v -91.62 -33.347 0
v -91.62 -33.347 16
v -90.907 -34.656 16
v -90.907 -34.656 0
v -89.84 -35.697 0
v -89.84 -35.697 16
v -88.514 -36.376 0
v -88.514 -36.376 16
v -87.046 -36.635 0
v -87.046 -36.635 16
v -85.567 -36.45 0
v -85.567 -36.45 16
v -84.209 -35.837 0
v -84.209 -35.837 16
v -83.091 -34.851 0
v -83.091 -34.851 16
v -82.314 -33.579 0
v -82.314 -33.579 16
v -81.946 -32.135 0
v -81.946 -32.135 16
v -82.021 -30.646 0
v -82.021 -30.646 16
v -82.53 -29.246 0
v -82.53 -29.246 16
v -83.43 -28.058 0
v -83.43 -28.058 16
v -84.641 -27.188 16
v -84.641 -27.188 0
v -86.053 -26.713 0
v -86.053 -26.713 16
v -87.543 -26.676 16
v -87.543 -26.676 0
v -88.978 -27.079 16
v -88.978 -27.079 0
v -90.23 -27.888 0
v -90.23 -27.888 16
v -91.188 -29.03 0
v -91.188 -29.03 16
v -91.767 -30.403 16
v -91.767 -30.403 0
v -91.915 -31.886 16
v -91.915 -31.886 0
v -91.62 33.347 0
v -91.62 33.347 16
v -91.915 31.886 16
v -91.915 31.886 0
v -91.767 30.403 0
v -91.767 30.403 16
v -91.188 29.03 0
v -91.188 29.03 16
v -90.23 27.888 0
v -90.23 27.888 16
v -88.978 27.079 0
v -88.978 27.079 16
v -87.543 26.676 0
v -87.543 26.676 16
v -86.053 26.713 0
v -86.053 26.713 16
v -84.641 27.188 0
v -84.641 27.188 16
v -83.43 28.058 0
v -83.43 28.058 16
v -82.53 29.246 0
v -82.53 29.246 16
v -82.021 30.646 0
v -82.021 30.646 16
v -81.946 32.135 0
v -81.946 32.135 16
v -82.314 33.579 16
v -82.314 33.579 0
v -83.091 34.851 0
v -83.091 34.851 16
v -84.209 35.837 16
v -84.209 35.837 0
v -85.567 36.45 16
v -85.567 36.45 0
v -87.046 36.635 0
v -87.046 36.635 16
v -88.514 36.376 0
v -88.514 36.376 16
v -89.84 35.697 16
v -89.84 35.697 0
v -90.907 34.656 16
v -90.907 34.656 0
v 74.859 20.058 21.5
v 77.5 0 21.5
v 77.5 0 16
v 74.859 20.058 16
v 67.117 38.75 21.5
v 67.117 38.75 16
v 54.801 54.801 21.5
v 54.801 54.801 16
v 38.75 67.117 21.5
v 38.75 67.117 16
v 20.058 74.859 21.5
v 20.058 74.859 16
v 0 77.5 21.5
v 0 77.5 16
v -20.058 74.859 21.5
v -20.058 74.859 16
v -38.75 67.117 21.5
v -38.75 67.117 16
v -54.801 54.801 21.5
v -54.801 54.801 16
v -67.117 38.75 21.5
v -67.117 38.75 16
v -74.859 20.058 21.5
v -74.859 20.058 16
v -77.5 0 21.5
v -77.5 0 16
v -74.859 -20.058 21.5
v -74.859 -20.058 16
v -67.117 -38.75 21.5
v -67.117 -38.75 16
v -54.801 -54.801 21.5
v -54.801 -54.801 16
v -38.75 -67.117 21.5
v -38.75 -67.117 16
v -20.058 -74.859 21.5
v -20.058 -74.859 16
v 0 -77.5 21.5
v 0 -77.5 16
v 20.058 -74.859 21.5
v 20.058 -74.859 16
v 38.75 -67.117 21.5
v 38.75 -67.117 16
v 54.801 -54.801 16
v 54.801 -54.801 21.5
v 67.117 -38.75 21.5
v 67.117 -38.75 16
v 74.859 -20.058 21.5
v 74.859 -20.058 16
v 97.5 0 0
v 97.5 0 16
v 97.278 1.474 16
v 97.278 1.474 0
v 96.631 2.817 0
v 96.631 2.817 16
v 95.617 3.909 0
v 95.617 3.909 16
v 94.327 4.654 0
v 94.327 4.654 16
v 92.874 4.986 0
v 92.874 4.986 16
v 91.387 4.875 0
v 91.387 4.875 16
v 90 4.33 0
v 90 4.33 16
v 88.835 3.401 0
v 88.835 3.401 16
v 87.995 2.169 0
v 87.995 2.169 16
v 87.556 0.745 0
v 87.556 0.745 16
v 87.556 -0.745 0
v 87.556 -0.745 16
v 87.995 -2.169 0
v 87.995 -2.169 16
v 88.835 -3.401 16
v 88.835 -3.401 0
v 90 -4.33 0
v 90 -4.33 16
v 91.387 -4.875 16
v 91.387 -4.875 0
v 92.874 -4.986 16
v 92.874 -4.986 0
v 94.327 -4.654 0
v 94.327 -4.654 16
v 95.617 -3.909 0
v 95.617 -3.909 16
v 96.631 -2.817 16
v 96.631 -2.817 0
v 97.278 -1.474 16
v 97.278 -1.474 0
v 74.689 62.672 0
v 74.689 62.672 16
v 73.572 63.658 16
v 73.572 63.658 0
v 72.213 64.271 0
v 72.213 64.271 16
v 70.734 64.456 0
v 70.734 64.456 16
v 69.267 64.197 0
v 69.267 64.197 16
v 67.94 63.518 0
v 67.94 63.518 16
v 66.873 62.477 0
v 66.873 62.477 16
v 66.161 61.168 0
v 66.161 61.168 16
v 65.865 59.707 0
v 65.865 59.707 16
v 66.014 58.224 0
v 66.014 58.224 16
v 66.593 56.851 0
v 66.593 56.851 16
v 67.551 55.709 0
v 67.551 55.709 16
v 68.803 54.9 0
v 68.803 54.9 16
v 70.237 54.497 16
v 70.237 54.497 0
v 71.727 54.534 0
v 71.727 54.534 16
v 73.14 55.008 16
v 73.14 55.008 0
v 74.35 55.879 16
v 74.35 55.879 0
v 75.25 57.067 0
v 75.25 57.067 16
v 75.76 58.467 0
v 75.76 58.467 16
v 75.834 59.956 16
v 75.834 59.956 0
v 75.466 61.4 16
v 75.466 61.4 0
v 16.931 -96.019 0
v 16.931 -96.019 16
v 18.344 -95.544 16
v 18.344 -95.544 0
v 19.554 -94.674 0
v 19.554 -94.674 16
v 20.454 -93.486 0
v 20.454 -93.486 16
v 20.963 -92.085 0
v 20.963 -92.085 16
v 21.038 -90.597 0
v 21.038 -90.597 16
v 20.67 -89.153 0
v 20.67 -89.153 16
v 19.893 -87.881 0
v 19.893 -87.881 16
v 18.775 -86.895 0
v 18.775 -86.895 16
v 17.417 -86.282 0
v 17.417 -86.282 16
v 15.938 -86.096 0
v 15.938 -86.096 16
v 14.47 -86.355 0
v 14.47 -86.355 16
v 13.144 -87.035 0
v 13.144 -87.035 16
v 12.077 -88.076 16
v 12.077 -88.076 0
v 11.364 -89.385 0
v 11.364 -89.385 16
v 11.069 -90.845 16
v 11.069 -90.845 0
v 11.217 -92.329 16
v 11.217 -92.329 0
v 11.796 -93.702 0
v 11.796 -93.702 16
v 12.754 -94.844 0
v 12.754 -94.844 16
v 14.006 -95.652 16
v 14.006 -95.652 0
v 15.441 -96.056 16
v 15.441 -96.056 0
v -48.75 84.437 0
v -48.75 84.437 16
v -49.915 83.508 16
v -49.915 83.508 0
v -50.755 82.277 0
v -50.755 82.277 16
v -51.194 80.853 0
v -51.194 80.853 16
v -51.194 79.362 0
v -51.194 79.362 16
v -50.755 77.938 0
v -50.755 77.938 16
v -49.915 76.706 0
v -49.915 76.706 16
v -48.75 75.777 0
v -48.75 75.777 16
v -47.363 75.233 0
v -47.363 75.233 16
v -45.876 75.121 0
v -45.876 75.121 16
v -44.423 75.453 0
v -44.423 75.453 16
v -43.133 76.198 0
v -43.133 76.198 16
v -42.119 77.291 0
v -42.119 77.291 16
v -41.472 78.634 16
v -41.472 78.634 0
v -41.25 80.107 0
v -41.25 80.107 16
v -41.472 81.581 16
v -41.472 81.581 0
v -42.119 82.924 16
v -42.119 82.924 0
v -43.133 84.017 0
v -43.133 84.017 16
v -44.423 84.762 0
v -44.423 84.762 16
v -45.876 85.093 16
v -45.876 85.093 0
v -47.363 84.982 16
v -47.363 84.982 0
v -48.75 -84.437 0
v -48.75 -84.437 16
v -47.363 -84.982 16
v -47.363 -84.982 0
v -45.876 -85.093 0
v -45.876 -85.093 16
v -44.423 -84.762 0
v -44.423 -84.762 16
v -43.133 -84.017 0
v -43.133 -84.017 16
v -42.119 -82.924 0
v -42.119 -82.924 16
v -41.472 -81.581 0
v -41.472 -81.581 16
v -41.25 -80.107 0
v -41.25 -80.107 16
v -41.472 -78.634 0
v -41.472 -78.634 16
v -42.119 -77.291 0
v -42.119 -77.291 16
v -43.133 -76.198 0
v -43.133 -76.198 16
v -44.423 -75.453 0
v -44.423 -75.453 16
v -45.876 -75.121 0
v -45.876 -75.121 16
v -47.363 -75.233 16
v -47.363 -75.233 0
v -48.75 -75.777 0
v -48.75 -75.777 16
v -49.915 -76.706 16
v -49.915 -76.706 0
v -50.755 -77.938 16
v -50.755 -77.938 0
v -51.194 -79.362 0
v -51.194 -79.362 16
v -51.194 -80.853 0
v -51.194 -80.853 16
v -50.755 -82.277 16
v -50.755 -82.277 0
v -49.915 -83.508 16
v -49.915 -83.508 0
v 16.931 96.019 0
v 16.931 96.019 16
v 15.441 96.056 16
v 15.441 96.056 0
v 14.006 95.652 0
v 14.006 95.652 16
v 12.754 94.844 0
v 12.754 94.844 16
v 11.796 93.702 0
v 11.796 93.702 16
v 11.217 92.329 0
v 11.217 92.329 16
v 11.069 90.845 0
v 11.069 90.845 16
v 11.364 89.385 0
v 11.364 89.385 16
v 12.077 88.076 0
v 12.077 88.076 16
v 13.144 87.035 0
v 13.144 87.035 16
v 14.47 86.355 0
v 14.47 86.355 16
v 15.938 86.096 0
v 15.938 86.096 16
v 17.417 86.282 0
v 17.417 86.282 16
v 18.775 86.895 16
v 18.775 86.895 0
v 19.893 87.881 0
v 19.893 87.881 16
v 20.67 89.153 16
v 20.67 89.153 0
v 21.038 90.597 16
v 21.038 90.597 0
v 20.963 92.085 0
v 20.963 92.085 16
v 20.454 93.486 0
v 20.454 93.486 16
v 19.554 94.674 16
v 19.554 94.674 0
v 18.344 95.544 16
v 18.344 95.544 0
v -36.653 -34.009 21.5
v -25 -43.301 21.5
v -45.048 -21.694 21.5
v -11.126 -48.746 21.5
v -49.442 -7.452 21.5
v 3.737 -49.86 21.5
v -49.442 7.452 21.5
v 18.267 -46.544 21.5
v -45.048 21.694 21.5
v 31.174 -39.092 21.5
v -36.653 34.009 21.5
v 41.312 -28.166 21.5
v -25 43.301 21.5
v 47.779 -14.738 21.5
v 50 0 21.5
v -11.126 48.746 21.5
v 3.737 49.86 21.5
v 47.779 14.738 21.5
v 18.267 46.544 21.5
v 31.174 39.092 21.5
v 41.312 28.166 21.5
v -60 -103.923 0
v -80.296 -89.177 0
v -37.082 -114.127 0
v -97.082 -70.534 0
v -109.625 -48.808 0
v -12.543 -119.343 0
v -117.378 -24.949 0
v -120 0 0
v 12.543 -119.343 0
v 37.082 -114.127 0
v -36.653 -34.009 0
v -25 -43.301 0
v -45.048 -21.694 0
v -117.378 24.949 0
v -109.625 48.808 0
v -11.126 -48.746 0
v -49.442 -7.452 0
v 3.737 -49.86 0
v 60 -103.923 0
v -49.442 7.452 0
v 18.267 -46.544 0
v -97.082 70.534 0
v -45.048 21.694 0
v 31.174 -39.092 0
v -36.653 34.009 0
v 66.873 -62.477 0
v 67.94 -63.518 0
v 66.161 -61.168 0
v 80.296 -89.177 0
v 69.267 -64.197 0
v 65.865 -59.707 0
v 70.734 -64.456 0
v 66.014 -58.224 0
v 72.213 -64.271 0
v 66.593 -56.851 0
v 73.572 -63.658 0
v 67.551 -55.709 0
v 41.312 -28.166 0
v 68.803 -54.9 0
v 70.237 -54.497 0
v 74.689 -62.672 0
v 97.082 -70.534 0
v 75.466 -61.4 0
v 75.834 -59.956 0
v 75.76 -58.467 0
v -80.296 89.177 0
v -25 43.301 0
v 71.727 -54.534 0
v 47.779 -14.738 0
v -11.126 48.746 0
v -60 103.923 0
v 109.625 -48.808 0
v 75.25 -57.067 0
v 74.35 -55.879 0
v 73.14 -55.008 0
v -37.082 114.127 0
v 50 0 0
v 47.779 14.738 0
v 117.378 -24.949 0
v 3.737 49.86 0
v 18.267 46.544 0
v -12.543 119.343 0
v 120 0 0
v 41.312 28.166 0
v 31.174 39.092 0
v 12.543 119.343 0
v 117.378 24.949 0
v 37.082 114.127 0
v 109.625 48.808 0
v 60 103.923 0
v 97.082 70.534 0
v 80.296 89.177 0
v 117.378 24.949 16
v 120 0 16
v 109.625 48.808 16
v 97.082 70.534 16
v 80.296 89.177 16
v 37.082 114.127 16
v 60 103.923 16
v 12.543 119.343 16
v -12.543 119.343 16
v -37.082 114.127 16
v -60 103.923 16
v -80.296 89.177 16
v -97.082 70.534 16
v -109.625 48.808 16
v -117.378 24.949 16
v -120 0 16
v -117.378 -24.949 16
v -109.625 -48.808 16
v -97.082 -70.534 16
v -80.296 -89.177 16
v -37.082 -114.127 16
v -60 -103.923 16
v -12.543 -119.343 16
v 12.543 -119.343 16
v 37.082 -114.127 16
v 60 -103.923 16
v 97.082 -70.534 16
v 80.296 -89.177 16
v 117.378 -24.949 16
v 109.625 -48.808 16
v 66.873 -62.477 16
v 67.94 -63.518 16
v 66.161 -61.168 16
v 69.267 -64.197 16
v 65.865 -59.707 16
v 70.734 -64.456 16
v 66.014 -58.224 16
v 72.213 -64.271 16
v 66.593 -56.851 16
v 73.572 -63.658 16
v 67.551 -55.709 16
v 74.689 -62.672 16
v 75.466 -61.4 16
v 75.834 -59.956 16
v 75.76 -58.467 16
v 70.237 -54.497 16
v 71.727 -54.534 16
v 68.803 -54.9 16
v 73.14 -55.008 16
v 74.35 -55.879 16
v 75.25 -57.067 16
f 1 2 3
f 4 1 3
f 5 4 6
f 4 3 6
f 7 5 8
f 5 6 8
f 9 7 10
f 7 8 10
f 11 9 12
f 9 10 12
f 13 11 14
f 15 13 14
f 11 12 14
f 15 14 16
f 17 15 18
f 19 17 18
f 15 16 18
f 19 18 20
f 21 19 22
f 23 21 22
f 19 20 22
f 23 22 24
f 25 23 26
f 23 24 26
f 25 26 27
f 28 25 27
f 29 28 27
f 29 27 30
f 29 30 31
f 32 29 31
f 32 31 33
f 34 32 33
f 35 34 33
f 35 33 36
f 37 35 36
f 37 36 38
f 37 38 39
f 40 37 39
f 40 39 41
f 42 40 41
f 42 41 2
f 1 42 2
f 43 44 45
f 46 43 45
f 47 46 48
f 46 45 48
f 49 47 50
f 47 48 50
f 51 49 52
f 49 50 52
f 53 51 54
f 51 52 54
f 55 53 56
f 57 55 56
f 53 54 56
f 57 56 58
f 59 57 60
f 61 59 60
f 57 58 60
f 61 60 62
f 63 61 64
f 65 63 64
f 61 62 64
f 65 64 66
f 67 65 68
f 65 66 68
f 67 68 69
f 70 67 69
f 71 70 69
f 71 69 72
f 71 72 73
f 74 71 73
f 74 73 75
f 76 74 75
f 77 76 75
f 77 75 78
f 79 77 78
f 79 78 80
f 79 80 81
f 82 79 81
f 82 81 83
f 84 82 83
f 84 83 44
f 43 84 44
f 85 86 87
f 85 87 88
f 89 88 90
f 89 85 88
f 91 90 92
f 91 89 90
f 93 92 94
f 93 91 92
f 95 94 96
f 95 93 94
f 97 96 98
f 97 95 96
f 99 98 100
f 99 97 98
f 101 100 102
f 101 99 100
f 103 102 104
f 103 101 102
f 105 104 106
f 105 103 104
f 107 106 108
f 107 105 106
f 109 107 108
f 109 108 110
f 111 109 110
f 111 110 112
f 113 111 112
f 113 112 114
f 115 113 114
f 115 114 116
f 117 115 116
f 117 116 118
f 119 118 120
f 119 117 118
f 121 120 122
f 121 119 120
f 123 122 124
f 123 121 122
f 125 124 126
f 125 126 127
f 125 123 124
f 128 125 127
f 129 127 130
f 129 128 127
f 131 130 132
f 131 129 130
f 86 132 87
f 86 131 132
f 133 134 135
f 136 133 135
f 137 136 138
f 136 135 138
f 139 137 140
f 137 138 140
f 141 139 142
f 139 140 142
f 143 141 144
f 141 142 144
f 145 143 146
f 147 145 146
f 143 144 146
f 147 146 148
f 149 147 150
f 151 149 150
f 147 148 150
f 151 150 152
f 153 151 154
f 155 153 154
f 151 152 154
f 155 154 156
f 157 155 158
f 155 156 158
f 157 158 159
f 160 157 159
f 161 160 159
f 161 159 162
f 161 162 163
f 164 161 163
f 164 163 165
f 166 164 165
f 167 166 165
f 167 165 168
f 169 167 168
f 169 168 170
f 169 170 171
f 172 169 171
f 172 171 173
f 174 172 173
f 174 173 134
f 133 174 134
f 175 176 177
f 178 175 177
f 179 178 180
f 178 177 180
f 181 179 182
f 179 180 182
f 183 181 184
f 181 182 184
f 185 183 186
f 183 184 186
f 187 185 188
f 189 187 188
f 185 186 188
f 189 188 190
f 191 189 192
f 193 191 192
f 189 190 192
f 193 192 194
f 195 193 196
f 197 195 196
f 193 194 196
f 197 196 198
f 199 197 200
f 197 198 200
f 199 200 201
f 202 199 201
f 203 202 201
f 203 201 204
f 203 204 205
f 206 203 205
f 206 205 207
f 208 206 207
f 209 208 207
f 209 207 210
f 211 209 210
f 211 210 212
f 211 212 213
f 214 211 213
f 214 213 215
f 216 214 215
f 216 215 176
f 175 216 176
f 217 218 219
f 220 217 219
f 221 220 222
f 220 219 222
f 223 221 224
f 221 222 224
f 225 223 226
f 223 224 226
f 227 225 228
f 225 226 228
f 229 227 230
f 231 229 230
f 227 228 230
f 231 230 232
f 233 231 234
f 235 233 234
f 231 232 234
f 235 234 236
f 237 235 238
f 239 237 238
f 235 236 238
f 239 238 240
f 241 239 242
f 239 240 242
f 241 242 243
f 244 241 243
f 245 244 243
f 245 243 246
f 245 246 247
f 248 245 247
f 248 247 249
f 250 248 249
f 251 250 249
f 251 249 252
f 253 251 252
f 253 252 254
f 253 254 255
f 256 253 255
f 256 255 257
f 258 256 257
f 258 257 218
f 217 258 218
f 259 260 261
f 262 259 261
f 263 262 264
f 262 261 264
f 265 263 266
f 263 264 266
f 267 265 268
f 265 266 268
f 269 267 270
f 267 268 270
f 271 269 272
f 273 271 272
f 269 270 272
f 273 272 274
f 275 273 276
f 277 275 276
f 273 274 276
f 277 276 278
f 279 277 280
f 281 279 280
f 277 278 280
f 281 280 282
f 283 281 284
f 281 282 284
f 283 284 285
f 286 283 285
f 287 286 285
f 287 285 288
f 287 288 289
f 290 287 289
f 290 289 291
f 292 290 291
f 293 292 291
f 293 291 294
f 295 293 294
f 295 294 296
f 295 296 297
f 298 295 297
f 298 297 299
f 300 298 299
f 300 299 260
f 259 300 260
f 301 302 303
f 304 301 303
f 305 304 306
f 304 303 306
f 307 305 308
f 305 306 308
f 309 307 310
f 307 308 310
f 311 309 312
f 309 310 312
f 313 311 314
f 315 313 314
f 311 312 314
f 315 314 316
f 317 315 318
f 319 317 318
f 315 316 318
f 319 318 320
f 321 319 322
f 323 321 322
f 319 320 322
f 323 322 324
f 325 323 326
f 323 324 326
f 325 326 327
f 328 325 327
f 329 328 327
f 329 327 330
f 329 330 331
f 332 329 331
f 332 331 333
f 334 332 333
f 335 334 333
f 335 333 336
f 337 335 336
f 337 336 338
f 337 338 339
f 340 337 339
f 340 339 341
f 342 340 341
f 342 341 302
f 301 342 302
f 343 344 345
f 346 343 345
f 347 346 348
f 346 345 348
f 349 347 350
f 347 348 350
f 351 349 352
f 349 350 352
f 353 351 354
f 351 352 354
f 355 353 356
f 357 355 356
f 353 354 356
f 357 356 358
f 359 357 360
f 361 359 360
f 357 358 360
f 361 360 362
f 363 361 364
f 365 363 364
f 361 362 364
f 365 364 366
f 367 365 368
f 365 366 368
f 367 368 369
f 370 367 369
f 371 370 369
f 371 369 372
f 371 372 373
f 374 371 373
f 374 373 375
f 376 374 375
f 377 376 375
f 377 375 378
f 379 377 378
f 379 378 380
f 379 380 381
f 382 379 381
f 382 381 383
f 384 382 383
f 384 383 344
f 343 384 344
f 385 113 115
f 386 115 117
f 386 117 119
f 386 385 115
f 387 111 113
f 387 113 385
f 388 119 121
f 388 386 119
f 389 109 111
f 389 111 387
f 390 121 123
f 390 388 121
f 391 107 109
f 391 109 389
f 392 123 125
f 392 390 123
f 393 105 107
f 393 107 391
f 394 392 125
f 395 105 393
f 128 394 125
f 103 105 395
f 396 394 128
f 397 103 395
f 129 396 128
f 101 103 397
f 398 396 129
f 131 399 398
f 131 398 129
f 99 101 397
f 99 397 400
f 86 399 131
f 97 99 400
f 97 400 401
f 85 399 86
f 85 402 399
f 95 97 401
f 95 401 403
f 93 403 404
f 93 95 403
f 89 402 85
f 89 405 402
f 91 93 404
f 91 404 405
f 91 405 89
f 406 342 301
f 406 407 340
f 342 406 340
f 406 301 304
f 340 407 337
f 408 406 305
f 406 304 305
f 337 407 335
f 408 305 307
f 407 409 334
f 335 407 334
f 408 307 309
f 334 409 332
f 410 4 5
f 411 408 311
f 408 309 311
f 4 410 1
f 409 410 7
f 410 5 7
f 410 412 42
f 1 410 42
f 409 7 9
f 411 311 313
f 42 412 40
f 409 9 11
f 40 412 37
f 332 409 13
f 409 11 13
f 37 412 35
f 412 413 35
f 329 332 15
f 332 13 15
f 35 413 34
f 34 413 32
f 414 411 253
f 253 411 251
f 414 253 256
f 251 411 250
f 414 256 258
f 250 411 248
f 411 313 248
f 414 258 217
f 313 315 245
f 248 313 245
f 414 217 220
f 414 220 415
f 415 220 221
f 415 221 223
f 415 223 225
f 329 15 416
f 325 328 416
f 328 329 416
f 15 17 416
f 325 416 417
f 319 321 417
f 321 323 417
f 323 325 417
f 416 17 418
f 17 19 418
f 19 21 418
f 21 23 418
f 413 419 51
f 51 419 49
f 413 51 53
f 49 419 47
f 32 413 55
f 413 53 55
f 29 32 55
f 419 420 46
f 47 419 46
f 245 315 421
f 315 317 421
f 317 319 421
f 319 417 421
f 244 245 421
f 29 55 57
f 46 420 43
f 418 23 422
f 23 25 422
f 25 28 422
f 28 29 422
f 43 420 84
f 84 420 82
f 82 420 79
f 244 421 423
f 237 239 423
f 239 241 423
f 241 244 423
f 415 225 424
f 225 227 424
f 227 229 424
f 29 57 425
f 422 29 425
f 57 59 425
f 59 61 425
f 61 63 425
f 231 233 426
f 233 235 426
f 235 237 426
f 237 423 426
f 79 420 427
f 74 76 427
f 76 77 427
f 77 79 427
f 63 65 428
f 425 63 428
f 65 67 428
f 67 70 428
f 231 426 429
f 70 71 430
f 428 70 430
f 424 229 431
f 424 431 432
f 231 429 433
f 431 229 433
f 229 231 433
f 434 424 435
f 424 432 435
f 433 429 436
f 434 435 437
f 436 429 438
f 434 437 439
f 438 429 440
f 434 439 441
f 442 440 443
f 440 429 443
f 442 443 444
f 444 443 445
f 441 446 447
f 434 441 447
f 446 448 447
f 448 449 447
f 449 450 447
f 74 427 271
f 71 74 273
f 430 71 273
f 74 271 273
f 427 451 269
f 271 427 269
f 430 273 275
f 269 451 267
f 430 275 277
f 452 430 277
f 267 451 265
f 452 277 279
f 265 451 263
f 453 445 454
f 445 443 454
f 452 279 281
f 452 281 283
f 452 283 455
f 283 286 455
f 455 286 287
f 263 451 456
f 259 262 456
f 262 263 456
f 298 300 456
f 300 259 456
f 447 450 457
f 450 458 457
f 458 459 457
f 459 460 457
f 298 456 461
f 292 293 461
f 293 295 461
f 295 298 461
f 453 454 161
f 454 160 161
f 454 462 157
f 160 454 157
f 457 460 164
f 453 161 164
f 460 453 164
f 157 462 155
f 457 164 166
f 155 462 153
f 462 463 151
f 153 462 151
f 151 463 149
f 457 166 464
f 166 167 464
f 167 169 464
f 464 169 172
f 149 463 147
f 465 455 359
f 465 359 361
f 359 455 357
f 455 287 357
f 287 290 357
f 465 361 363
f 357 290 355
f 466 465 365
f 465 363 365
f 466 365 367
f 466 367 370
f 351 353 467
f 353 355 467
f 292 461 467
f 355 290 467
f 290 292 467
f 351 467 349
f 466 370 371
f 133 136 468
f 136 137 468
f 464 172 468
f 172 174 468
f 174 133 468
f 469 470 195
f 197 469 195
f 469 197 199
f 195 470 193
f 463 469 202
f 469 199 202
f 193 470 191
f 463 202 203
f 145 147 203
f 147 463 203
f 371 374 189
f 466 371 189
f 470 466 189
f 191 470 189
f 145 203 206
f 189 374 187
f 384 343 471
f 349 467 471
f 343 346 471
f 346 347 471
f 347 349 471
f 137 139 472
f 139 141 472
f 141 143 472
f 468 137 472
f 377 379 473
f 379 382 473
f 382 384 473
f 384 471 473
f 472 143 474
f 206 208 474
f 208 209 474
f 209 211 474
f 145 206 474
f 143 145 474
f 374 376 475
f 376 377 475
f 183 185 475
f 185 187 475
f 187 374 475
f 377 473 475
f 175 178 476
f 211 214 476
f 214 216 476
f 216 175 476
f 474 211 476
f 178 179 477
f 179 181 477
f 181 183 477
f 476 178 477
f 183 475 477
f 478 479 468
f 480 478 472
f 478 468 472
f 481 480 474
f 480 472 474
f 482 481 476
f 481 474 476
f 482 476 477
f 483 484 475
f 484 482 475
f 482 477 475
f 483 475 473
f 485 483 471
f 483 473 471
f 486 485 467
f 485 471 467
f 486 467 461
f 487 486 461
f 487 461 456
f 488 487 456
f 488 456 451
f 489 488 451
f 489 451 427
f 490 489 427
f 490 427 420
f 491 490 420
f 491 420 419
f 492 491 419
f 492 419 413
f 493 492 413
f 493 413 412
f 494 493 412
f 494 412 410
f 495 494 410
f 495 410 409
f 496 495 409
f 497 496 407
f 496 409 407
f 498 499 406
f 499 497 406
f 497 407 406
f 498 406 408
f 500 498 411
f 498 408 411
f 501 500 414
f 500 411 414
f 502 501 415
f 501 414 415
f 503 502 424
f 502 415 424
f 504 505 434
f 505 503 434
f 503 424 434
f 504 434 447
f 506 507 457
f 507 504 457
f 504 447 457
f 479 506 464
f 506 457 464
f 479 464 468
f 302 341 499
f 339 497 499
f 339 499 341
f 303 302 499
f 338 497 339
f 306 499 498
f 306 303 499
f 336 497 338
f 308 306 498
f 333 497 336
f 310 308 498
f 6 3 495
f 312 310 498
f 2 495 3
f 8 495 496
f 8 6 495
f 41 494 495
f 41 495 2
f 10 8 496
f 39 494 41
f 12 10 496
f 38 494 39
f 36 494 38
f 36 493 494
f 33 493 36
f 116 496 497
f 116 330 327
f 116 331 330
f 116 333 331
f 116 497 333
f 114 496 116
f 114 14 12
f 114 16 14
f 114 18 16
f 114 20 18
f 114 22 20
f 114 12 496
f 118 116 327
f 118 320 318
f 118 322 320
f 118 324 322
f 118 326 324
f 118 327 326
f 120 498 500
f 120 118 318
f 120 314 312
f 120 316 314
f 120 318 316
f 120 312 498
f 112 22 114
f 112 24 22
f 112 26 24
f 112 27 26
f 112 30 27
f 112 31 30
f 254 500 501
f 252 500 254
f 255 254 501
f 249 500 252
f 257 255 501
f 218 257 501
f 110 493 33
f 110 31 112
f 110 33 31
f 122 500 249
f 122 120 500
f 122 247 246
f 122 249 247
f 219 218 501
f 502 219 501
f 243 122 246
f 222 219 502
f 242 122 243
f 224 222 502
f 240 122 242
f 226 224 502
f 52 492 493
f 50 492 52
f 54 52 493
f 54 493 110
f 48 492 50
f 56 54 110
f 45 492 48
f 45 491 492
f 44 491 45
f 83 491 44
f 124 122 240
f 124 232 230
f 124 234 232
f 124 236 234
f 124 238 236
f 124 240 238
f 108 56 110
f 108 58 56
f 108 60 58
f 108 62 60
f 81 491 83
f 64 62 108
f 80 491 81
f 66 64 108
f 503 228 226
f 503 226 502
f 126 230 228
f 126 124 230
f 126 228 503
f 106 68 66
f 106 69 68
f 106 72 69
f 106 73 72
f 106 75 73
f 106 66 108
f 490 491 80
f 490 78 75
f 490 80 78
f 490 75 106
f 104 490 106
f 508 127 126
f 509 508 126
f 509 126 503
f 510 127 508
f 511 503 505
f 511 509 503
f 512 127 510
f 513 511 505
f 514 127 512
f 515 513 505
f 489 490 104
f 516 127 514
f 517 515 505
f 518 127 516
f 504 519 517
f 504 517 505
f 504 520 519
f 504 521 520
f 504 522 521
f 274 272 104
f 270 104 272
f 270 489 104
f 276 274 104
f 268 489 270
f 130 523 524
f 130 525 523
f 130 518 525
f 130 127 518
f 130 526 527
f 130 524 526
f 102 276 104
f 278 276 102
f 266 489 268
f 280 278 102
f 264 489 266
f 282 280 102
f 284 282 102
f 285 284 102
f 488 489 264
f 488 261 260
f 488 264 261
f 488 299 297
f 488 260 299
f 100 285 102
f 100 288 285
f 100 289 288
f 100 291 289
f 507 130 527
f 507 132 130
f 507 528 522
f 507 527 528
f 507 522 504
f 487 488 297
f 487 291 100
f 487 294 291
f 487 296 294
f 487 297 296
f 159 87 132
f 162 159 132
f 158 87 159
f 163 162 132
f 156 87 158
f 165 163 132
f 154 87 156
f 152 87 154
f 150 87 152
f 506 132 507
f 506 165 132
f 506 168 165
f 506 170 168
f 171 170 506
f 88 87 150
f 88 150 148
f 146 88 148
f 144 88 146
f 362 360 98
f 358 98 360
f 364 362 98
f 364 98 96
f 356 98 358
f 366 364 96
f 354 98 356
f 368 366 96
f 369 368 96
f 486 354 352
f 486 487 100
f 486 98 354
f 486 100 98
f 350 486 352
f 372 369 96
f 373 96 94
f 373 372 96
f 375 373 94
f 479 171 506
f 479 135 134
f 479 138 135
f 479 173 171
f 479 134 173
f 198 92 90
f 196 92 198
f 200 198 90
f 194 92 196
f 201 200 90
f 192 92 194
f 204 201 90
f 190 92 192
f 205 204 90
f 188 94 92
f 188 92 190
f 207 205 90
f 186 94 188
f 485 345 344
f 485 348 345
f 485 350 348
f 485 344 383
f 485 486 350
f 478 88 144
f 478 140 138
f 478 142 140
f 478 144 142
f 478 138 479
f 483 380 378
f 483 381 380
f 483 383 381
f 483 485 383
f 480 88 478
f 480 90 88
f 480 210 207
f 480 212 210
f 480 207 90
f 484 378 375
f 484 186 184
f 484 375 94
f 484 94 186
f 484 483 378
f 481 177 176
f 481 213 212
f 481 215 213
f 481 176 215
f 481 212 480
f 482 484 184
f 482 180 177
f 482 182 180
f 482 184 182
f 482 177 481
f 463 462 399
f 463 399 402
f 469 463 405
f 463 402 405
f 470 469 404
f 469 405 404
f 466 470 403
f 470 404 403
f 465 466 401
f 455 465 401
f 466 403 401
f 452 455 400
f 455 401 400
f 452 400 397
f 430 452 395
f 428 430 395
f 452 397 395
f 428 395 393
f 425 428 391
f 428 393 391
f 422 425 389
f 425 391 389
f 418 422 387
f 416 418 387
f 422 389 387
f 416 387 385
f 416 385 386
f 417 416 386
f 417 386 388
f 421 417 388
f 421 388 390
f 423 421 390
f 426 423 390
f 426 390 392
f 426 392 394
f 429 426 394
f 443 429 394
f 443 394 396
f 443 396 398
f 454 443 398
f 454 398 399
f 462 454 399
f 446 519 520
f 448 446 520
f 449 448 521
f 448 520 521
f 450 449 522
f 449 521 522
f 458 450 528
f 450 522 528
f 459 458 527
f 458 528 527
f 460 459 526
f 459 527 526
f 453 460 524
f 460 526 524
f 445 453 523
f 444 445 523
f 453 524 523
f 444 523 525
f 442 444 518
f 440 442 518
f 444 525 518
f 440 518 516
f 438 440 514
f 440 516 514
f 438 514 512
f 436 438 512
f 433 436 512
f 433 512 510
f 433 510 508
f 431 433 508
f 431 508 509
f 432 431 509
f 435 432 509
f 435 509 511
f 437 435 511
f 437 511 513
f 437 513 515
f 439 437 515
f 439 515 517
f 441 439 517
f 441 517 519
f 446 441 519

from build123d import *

# Parameters (mm, degrees)
SKETCH1_R           = 120
BOSS_EXTRUDE1_DEPTH = 21.5
SKETCH2_OUTSIDE_W   = 310.018
SKETCH2_OUTSIDE_H   = 310.018
SKETCH2_OUTSIDE_R   = 77.5
CUT_EXTRUDE1_DEPTH  = 5.5
SKETCH3_R           = 5
CUT_EXTRUDE2_DEPTH  = 171.458206021
CIRPATTERN1_COUNT   = 9
SKETCH4_R           = 50
CUT_EXTRUDE3_DEPTH  = 172.062123218


with BuildPart() as part:
    # Sketch1 → Boss-Extrude1 (new body)
    with BuildSketch(Plane.XY):
        Circle(SKETCH1_R)
    extrude(amount=BOSS_EXTRUDE1_DEPTH)

    # Sketch2 outside → Cut-Extrude1 (cut)
    with BuildSketch(Plane.XY.offset(21.5)):
        Rectangle(SKETCH2_OUTSIDE_W, SKETCH2_OUTSIDE_H)
        Circle(SKETCH2_OUTSIDE_R, mode=Mode.SUBTRACT)
    extrude(amount=-CUT_EXTRUDE1_DEPTH, mode=Mode.SUBTRACT)

    # Sketch3 → Cut-Extrude2 (cut, through all)
    with BuildSketch(Plane.XY.offset(16)):
        with Locations((92.5, 0)):
            Circle(SKETCH3_R)
    cut_extrude2 = extrude(amount=-CUT_EXTRUDE2_DEPTH, mode=Mode.SUBTRACT)

    # CirPattern1: Cut-Extrude2 ×9 about axis
    cirpattern1_axis = Axis((0, 0, 0), (0, 0, 1))
    for i in range(1, CIRPATTERN1_COUNT):
        add(cut_extrude2.rotate(cirpattern1_axis, i * 360 / CIRPATTERN1_COUNT), mode=Mode.SUBTRACT)

    # Sketch4 → Cut-Extrude3 (cut, through all)
    with BuildSketch(Plane.XY.offset(21.5)):
        Circle(SKETCH4_R)
    extrude(amount=-CUT_EXTRUDE3_DEPTH, mode=Mode.SUBTRACT)


solid = part.part
